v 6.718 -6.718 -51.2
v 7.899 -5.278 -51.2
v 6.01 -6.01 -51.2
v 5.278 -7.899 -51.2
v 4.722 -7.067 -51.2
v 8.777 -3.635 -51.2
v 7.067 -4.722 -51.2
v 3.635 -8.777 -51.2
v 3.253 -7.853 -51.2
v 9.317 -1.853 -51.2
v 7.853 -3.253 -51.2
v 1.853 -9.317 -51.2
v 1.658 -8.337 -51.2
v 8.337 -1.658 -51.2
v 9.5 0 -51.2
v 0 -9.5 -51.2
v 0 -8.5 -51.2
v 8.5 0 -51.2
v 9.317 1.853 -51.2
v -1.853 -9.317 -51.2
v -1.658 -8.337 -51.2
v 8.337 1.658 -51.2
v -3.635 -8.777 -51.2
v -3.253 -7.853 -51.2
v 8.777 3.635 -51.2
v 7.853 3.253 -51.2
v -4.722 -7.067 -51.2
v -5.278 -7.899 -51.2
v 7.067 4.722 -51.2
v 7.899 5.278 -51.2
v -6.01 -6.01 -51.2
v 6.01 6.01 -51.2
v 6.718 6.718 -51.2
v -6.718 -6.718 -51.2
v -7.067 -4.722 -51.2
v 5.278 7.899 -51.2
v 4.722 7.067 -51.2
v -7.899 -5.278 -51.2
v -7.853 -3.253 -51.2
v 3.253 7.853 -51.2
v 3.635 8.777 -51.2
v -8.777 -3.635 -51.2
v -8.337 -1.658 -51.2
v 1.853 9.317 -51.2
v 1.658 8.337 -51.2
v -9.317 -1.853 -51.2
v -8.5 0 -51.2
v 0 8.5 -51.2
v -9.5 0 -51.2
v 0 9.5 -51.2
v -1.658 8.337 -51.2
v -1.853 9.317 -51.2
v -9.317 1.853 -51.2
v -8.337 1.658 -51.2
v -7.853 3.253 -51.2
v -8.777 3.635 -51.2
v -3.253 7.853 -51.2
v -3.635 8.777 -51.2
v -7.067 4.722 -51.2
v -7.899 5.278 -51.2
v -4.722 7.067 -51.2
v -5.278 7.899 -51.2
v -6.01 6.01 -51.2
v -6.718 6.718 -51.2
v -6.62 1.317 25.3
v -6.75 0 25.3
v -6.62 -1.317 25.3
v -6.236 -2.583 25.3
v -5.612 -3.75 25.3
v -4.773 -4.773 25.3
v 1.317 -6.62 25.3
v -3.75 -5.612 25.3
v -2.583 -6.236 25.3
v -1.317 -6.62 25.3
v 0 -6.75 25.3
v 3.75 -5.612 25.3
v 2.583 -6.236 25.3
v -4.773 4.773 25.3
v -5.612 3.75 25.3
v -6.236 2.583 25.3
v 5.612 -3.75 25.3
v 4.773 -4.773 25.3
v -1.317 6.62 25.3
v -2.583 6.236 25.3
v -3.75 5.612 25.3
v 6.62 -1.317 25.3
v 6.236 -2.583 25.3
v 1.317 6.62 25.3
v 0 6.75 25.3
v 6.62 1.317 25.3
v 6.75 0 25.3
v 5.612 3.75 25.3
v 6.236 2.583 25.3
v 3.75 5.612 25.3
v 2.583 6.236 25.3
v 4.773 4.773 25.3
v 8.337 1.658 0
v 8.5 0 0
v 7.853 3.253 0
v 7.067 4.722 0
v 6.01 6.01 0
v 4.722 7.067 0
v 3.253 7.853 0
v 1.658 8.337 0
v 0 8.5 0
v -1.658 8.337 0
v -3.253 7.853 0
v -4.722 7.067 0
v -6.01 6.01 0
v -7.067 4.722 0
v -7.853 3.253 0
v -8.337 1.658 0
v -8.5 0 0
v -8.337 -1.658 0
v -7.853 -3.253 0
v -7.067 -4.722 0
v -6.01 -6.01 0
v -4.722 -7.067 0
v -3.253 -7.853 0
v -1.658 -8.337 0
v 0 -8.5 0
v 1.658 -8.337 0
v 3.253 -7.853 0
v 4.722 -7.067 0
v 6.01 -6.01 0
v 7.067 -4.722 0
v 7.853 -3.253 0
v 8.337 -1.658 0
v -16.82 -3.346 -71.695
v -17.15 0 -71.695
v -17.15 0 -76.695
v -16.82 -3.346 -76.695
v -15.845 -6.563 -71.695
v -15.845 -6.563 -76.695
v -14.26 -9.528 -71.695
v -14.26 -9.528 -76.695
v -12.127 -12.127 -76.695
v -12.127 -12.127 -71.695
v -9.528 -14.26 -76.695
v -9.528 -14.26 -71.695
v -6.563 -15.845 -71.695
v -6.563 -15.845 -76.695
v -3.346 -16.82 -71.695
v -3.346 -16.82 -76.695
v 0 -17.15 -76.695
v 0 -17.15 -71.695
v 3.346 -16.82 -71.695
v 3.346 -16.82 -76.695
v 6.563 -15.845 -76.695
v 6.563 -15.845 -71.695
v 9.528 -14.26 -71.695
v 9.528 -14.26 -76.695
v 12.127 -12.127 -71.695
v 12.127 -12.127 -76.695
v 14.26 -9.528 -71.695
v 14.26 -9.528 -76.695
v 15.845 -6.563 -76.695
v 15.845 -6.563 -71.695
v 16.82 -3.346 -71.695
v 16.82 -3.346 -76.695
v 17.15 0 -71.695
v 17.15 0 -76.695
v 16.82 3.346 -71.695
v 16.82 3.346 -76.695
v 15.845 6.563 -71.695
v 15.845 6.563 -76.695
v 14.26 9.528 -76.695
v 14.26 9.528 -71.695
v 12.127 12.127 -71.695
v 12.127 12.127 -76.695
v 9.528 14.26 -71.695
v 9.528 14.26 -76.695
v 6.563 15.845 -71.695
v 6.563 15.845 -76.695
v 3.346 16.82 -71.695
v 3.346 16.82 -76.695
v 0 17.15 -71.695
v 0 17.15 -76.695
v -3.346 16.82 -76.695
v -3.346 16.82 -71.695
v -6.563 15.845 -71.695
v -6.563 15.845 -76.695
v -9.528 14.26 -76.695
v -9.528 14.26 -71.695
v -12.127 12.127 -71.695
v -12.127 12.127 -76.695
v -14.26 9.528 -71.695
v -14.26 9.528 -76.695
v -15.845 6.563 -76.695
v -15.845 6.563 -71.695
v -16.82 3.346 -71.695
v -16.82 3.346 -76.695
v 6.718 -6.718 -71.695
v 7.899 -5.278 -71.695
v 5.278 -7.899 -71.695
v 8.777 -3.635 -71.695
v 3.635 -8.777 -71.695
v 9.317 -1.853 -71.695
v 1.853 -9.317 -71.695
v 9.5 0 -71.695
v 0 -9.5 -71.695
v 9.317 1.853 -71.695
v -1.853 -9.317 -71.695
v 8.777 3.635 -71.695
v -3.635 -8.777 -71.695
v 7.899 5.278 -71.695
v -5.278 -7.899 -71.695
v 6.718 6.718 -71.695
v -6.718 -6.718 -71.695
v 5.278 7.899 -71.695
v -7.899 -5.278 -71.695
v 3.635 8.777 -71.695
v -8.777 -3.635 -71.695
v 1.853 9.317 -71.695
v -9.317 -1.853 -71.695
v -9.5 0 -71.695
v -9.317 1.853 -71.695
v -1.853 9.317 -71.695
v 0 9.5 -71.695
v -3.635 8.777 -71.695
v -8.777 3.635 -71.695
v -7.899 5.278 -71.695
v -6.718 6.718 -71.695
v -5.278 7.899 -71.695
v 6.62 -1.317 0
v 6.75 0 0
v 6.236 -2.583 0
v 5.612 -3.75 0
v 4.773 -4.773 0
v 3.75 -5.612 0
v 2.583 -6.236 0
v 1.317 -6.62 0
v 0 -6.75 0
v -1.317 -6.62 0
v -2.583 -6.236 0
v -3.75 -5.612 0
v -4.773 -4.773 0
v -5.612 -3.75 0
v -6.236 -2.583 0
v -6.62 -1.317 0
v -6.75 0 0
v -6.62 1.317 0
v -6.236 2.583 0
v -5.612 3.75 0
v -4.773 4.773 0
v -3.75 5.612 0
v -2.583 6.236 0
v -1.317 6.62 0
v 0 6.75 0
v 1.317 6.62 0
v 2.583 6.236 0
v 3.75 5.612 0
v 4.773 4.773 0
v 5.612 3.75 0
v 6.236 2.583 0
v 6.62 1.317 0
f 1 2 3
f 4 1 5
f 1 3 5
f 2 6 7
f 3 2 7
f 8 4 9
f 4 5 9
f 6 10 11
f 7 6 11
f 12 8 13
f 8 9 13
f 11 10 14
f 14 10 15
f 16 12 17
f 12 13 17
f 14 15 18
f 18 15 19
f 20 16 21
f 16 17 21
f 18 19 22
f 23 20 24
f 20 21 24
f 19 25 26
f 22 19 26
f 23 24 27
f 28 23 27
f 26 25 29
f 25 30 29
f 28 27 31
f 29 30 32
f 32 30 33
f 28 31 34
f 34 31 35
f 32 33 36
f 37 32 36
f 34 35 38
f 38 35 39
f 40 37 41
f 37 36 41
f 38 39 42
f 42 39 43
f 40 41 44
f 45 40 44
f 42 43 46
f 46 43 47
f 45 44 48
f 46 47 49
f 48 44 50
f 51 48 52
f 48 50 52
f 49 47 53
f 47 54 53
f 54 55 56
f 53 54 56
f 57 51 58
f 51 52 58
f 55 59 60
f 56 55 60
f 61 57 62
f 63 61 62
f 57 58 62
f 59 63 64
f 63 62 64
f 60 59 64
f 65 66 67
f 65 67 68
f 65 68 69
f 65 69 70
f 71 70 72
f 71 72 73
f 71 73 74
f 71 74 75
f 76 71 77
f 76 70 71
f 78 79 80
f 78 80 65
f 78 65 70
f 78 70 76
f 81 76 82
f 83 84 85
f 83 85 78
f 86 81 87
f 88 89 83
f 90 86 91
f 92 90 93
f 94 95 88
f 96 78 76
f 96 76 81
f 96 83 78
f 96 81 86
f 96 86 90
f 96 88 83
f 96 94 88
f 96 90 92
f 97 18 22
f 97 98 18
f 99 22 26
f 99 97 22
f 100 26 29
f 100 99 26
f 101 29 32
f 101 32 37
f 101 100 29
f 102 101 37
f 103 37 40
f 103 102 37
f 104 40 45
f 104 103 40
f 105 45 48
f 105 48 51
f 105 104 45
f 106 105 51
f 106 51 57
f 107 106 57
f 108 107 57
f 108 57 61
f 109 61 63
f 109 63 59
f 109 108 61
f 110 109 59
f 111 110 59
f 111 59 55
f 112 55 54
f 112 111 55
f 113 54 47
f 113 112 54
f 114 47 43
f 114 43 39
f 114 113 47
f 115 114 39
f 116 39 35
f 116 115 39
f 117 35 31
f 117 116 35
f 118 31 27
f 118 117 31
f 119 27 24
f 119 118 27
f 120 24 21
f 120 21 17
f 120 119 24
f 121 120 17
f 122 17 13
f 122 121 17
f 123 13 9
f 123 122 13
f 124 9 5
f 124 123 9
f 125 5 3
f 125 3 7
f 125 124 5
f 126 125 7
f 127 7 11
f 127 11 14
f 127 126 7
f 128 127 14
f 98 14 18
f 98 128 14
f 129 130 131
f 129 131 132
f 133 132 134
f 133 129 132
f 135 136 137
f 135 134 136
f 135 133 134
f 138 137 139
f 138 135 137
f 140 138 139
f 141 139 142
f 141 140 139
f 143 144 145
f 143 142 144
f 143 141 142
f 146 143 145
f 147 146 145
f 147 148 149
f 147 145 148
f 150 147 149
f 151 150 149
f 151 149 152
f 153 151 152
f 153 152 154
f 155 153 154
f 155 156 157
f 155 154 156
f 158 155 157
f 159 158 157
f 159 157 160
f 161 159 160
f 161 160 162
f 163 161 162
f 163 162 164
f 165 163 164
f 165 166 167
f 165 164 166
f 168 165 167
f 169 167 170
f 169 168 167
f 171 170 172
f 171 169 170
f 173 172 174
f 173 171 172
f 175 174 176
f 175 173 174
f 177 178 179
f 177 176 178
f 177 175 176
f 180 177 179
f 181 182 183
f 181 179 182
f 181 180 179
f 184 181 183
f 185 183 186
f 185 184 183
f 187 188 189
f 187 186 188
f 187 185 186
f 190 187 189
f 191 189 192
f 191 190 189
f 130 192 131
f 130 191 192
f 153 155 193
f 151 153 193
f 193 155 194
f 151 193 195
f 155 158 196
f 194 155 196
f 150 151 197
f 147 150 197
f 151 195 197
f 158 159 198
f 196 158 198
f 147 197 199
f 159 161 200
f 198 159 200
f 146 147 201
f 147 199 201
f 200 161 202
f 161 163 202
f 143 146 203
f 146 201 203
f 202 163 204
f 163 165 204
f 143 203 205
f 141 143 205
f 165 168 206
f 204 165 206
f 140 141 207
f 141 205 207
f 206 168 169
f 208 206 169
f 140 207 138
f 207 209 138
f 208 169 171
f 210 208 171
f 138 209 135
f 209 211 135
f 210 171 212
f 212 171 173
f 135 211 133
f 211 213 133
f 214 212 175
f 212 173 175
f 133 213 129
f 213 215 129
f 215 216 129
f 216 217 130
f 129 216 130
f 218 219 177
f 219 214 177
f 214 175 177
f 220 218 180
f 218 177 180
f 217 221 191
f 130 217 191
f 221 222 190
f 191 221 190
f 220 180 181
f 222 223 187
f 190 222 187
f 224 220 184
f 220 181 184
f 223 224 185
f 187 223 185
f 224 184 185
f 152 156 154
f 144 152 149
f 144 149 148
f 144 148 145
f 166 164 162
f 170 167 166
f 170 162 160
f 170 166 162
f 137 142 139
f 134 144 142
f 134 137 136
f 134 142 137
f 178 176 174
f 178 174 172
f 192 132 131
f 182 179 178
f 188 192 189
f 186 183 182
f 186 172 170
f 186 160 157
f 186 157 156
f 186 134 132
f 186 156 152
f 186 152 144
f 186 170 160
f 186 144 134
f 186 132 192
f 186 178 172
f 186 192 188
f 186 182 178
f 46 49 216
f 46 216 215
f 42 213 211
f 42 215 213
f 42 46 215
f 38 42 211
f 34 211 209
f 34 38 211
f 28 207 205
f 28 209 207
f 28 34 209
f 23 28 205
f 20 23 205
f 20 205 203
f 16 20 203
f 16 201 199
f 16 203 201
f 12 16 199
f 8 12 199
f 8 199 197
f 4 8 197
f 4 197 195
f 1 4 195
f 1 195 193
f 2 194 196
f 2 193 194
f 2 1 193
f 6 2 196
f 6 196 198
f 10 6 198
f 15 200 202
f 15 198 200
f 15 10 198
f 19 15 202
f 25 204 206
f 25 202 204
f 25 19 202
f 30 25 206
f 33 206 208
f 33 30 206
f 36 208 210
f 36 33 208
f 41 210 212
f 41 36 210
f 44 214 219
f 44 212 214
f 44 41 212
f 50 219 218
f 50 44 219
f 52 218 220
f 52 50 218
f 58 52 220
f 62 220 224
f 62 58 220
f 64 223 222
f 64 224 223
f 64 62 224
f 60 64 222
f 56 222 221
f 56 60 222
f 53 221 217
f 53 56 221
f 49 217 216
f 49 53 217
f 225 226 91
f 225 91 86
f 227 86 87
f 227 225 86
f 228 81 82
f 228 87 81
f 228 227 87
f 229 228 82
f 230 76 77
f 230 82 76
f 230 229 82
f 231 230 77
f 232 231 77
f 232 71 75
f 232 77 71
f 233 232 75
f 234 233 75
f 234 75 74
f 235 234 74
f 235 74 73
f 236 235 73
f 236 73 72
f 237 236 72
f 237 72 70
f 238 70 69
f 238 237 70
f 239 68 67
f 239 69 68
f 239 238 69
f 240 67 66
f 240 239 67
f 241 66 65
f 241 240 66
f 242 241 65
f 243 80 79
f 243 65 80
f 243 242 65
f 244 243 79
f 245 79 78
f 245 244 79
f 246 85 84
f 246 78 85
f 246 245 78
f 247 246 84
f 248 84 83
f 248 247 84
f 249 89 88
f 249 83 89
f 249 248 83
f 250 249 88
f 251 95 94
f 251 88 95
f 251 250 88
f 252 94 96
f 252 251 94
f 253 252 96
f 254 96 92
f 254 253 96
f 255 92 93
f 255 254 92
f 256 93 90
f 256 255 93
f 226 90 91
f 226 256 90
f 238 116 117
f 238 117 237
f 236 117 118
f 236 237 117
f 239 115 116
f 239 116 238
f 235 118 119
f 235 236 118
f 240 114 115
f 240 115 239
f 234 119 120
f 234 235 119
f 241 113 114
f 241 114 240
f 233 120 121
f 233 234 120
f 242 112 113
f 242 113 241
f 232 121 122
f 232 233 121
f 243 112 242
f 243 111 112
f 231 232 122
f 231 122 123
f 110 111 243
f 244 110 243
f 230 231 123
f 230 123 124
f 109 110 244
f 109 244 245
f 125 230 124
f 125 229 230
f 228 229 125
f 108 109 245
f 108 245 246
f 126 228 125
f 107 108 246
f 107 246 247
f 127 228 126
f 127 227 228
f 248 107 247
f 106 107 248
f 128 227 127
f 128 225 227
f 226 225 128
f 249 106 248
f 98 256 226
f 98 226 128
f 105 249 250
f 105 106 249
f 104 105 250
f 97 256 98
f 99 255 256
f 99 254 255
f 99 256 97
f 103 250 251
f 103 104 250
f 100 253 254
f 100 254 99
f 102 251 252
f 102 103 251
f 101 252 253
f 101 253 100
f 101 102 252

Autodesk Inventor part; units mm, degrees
ref_plane "YZ Plane" through (0, 0, 0) normal (1, 0, 0) x (0, 1, 0)
ref_plane "XZ Plane" through (0, 0, 0) normal (0, 1, 0) x (-1, 0, 0)
ref_plane "XY Plane" through (0, 0, 0) normal (0, 0, 1) x (1, 0, 0)
sketch "Sketch1" plane through (0, 0, 0) normal (0, 0, 1) x (1, 0, 0)
  circle A0 centre (0, 0) radius 8.5
  dimension "d0" = 17
extrude "Extrusion1" add sketch "Sketch1" against normal blind 51.2
sketch "Sketch2" plane through (0, 0, 0) normal (0, 0, 1) x (1, 0, 0)
  circle A0 centre (0, 0) radius 6.75
  dimension "d3" = 13.5
extrude "Extrusion2" add sketch "Sketch2" along normal blind 25.3
sketch "Sketch3" plane through (0, 0, -51.2) normal (0, 0, -1) x (-1, 0, 0)
  circle A0 centre (0, 0) radius 9.5
  dimension "d6" = 19
extrude "Extrusion3" add sketch "Sketch3" along normal blind 20.4952
sketch "Sketch4" plane through (0, 0, -71.6952) normal (0, 0, -1) x (-1, 0, 0)
  circle A0 centre (0, 0) radius 17.15
  dimension "d9" = 34.3
extrude "Extrusion4" add sketch "Sketch4" along normal blind 5
properties part number "spindle"
